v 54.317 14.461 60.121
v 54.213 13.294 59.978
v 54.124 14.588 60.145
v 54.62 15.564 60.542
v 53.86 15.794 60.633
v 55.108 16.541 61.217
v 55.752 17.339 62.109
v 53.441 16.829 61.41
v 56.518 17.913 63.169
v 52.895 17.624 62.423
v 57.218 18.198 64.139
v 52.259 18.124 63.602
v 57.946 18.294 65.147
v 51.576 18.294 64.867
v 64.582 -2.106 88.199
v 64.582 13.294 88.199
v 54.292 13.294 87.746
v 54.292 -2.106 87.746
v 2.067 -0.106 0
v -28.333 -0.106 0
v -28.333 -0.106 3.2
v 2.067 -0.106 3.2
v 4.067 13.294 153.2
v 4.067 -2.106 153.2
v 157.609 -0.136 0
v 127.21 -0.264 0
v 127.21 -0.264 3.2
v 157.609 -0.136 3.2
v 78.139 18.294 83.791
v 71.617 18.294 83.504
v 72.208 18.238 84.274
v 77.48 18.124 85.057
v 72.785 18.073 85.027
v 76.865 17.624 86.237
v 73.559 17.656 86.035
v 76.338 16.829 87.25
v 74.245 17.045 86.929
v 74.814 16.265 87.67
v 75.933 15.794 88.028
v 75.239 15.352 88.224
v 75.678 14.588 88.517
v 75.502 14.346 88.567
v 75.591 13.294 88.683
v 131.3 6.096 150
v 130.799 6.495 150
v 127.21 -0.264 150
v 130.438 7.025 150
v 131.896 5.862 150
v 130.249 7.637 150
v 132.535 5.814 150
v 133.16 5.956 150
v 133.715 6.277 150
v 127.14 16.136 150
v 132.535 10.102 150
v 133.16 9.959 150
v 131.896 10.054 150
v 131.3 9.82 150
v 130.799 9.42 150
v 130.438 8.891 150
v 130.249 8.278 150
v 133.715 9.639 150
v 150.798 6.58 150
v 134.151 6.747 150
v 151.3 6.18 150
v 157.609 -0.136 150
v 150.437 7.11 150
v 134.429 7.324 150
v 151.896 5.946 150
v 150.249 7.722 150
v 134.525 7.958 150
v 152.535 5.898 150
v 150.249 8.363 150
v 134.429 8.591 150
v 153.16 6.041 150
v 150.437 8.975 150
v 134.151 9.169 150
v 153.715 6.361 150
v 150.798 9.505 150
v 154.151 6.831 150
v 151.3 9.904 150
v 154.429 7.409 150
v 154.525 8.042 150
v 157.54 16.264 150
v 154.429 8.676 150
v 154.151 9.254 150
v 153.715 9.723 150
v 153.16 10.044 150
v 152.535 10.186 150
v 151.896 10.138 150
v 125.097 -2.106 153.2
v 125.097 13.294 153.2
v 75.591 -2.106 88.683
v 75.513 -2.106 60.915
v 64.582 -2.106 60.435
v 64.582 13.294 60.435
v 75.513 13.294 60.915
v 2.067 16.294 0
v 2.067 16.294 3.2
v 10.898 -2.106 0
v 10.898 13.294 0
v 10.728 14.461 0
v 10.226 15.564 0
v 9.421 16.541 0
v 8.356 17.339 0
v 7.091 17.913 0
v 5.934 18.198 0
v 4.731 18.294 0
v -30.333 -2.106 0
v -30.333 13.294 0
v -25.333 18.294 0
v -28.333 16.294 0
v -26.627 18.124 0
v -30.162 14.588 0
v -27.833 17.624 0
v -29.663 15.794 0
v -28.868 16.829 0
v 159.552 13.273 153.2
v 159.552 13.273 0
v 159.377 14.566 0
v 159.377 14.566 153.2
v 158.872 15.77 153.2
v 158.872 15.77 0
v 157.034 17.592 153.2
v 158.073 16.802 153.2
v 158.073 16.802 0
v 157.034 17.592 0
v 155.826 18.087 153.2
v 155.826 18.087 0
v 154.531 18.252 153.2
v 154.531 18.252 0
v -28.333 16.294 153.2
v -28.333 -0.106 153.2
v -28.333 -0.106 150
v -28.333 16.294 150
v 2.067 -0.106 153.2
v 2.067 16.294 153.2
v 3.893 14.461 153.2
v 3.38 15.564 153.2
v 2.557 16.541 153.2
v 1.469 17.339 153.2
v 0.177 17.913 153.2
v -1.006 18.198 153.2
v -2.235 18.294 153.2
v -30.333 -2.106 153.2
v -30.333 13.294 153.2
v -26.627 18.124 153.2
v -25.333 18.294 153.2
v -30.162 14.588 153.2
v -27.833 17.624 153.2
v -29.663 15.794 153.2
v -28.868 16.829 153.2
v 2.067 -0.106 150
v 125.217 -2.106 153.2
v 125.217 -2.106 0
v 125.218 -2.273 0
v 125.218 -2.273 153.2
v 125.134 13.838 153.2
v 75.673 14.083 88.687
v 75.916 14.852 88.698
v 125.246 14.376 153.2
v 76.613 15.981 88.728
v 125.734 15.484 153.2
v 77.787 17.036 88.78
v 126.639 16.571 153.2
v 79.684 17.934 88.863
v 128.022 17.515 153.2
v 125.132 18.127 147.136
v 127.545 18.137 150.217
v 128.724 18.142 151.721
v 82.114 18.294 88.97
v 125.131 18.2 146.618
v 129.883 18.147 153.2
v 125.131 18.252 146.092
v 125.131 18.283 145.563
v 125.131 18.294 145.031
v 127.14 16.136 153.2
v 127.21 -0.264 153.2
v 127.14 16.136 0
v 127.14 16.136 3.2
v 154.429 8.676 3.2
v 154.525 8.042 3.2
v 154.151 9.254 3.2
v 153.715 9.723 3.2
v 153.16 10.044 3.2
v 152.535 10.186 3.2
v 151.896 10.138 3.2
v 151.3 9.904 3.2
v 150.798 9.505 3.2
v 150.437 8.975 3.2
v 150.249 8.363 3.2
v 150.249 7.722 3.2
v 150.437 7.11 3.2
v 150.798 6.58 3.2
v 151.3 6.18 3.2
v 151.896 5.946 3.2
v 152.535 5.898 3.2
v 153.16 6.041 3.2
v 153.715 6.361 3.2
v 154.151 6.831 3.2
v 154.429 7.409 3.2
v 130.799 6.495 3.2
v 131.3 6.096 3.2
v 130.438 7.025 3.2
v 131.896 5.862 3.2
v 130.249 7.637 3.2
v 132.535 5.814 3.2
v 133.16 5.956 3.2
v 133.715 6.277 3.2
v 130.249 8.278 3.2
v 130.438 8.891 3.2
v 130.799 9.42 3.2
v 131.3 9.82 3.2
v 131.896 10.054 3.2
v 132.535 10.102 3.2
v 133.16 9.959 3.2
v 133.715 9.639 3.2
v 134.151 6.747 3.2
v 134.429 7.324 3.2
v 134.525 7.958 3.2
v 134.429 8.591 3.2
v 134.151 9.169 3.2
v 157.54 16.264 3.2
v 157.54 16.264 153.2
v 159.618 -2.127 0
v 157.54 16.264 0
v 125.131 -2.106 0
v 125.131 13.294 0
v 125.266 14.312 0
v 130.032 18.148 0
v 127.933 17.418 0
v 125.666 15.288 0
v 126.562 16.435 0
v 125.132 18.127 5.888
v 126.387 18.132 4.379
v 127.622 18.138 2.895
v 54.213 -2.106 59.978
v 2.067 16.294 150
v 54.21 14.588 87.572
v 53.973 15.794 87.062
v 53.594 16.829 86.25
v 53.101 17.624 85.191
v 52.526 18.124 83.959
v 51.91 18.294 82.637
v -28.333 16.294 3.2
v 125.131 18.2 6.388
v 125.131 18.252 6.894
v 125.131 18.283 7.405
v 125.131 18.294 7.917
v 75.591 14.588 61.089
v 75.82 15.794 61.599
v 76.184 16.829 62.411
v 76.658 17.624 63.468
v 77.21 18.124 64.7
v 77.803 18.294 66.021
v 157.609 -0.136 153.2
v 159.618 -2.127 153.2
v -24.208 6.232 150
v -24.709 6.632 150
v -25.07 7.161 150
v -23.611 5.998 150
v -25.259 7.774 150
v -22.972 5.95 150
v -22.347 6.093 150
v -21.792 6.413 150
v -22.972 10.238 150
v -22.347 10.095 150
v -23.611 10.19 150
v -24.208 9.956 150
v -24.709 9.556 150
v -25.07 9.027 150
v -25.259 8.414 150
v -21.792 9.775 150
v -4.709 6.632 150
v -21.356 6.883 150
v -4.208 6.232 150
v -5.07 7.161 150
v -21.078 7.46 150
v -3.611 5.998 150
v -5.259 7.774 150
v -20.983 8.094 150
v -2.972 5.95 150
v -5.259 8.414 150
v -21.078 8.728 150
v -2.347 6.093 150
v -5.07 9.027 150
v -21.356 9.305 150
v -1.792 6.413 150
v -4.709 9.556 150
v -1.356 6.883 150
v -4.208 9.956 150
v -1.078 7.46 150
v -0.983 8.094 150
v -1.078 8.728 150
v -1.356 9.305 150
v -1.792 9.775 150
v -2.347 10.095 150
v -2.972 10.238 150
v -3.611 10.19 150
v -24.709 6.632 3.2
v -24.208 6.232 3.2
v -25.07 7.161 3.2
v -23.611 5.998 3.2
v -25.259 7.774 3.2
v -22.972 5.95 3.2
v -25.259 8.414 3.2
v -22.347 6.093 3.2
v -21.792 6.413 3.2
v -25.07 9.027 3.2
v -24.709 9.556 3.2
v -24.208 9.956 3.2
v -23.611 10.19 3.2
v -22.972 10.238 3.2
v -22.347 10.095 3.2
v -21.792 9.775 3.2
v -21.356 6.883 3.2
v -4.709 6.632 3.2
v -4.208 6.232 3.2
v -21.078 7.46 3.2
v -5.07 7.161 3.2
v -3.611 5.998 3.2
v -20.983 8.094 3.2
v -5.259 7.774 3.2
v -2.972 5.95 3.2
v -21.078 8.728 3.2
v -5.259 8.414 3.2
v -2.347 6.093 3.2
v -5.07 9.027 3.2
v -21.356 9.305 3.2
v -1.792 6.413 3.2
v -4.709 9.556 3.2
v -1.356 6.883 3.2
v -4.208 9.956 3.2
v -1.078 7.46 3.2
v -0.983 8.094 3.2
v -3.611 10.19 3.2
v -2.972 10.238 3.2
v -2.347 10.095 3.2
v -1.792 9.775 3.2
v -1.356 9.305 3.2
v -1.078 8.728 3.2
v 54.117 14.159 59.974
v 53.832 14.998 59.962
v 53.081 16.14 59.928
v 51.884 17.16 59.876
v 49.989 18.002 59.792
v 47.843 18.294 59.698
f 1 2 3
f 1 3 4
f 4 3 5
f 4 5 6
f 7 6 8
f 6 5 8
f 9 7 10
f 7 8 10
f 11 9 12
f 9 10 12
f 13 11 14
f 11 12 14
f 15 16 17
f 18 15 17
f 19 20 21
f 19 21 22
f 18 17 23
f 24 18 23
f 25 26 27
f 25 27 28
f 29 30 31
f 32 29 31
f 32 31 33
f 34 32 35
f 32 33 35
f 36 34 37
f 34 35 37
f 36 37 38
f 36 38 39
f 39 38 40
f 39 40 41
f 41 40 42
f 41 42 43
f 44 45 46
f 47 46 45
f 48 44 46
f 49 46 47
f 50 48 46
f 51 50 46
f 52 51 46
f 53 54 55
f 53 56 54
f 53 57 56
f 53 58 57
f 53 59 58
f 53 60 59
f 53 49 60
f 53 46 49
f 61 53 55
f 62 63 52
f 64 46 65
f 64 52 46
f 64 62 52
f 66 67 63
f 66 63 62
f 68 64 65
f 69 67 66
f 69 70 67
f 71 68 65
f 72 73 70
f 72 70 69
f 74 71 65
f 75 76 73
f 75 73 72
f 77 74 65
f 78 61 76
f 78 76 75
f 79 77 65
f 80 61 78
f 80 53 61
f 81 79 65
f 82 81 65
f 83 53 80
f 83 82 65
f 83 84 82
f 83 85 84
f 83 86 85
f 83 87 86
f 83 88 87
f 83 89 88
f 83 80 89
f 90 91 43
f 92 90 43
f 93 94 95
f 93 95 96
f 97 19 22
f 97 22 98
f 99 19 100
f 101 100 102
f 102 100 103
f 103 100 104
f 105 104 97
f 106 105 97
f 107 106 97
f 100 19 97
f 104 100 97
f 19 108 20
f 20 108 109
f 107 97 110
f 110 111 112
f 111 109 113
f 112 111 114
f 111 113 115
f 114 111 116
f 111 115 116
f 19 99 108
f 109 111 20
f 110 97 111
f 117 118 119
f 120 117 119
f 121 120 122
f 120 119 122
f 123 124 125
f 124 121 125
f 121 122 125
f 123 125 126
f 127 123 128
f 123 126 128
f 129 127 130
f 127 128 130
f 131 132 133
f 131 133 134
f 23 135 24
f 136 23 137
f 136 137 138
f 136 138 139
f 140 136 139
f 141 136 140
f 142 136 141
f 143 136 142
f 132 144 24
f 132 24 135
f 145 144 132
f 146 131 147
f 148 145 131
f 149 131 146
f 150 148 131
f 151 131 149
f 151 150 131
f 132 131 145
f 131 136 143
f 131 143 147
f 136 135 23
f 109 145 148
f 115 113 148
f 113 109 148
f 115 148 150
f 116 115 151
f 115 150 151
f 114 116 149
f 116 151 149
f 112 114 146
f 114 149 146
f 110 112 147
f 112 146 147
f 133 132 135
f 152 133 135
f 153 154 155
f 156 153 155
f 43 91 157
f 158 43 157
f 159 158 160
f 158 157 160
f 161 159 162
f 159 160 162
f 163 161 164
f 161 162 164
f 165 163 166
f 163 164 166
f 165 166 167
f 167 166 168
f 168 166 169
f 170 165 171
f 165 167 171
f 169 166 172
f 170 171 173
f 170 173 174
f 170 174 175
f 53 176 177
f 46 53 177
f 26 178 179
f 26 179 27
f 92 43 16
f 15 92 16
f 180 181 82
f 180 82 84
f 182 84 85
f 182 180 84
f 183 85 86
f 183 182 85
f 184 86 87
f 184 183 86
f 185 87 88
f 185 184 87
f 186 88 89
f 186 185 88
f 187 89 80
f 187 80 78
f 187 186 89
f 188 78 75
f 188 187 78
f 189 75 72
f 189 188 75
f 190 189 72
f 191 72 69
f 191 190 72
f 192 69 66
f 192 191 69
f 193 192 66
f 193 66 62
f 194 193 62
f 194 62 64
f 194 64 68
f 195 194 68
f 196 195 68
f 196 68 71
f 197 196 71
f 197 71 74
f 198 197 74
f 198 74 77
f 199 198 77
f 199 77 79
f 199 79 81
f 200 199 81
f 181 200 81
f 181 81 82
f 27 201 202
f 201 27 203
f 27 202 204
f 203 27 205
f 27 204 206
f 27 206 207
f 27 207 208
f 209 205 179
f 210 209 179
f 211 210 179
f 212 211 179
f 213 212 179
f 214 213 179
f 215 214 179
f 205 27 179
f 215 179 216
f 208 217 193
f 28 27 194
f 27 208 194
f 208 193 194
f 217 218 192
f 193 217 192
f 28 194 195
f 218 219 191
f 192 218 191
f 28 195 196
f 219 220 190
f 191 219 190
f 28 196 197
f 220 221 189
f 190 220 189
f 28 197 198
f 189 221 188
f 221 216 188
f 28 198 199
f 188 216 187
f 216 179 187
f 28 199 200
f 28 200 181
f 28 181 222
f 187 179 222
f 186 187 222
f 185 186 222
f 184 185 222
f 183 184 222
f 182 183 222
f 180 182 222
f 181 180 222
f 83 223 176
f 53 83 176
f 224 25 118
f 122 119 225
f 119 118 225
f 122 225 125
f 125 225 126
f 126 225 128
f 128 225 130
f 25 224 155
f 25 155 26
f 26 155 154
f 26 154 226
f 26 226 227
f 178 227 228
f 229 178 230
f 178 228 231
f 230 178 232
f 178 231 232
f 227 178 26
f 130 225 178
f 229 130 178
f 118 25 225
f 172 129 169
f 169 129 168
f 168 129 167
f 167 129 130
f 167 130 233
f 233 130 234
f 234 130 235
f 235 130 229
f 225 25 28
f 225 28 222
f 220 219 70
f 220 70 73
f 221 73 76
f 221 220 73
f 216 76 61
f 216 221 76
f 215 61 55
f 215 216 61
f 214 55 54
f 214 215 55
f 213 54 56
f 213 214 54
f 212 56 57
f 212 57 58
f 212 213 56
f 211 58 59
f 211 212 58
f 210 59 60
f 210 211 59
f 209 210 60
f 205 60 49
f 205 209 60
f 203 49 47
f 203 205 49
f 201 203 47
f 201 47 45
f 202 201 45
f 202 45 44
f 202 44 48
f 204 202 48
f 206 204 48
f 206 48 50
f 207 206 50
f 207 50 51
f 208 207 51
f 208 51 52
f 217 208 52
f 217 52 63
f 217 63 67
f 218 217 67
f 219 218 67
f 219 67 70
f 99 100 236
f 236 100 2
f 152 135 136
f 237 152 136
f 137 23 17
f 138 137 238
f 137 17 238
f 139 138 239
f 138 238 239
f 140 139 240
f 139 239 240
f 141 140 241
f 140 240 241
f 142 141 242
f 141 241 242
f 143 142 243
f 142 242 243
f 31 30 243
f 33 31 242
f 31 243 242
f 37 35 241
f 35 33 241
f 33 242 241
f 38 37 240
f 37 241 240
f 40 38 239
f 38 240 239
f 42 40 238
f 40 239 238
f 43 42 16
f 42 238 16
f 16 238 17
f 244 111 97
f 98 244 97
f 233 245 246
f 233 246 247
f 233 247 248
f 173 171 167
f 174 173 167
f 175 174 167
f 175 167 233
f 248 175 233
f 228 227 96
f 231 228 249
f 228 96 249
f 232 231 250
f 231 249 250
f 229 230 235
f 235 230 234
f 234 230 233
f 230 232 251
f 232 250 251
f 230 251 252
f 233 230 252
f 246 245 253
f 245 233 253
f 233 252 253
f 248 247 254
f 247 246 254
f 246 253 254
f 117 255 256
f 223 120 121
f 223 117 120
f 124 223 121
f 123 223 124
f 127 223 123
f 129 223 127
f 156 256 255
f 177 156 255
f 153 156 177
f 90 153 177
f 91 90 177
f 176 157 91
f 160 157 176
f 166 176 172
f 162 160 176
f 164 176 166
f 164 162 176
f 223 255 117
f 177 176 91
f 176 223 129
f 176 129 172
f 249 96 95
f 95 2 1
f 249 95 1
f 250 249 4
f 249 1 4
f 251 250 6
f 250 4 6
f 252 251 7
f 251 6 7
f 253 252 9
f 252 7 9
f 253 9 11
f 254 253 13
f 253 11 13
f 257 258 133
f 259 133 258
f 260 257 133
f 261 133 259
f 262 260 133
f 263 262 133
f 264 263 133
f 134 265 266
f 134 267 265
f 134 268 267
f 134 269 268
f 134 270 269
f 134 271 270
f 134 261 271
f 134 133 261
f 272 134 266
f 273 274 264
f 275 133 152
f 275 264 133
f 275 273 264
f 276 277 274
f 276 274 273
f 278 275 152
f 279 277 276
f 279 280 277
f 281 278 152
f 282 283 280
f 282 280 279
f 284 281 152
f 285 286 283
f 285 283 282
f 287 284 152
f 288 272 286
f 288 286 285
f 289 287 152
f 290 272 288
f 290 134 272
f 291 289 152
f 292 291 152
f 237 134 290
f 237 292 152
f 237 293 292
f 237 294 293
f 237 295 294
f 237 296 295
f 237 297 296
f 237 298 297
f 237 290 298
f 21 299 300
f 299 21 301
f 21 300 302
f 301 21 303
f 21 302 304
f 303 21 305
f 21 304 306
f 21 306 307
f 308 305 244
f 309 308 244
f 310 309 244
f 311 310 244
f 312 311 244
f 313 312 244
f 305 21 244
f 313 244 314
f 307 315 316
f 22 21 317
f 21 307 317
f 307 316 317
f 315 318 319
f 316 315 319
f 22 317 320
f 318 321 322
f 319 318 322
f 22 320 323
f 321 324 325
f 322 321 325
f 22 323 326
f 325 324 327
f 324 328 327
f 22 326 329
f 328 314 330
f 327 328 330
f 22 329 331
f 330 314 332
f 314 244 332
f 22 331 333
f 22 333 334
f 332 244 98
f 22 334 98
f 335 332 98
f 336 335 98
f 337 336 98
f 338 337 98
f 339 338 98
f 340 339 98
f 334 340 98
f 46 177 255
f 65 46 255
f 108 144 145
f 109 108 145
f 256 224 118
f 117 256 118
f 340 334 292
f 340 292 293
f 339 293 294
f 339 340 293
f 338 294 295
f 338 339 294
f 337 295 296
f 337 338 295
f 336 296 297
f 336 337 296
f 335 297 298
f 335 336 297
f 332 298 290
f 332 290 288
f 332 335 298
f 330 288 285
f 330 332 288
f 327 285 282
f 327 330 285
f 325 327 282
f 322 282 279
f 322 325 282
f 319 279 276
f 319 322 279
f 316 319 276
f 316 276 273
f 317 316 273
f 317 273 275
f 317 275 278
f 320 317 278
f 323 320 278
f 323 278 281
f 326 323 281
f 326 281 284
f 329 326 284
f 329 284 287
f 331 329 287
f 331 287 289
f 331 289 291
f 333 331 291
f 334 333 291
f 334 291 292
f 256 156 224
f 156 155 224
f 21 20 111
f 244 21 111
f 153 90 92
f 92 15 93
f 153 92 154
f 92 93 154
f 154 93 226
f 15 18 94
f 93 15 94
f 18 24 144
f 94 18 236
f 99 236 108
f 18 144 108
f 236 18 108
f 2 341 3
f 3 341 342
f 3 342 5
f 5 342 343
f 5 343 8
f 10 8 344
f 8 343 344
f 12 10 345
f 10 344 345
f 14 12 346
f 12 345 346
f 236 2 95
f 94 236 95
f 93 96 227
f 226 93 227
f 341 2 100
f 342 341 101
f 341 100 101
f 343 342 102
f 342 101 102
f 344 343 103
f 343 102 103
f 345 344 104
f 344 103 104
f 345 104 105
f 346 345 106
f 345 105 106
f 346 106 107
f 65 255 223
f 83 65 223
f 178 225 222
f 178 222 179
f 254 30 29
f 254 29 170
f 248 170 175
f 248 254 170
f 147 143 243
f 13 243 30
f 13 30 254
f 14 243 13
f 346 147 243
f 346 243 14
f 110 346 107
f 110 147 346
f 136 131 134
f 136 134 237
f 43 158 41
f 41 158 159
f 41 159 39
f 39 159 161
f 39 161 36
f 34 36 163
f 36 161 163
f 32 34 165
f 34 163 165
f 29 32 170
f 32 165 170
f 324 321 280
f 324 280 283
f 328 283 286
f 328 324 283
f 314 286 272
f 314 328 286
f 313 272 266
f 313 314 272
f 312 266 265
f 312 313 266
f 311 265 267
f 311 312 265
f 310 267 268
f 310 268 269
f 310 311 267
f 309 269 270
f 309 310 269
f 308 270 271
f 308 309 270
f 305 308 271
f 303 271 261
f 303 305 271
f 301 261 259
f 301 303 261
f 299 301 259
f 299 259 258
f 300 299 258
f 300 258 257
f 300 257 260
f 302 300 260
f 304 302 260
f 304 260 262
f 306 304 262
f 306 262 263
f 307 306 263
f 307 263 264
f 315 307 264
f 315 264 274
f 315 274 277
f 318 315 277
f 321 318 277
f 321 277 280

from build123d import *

# Parameters (mm, degrees)
SKETCH1_W             = 34.4
SKETCH1_H             = 20.4
SKETCH1_W_2           = 30.4
SKETCH1_H_2           = 16.4
BOSS_EXTRUDE1_DEPTH   = 3.2
BOSS_EXTRUDE1_2_DEPTH = 3.2
SKETCH4_W             = 34.4
SKETCH4_H             = 20.4
BOSS_EXTRUDE2_DEPTH   = 150
SKETCH5_W             = 30.4
SKETCH5_H             = 16.4
CUT_EXTRUDE2_DEPTH    = 3.2
BOSS_EXTRUDE4_REACH   = 221.091
SKETCH13_W            = 153.2
SKETCH13_H            = 20.4
CUT_EXTRUDE3_DEPTH    = 20.4
FILLET1_R             = 5
SKETCH2_R             = 2.15
CUT_EXTRUDE5_DEPTH    = 147


with BuildPart() as part:
    # Sketch1 → Boss-Extrude1 (new body)
    with BuildSketch(Plane.XY):
        with Locations((-13.13286664, 8.093964388)):
            Rectangle(SKETCH1_W, SKETCH1_H)
        with Locations((-13.13286664, 8.093964388)):
            Rectangle(SKETCH1_W_2, SKETCH1_H_2, mode=Mode.SUBTRACT)
    extrude(amount=BOSS_EXTRUDE1_DEPTH)



with BuildPart() as body_2:
    # Sketch1 → Boss-Extrude1 2 (new body)
    with BuildSketch(Plane.XY):
        Polygon((125.217994466, -2.2727378), (159.617685817, -2.127015635), (159.531269184, 18.272801329), (125.131577833, 18.127079165), align=None)
        Polygon((127.209504302, -0.264283525), (157.609231543, -0.135505799), (157.539759348, 16.264347055), (127.140032108, 16.135569328), align=None, mode=Mode.SUBTRACT)
    extrude(amount=BOSS_EXTRUDE1_2_DEPTH)


with BuildPart() as part_1:
    add(part.part)

    add(body_2.part)  # Boss-Extrude2 merges body 2
    # Sketch4 → Boss-Extrude2 (add)
    with BuildSketch(Plane.XY.offset(3.2)):
        with Locations((-13.13286664, 8.093964388)):
            Rectangle(SKETCH4_W, SKETCH4_H)
        Polygon((125.131577833, 18.127079165), (125.217994466, -2.2727378), (159.617685817, -2.127015635), (159.531269184, 18.272801329), align=None)
    extrude(amount=BOSS_EXTRUDE2_DEPTH)

    # Sketch5 → Cut-Extrude2 (cut)
    with BuildSketch(Plane.XY.offset(153.2)):
        with Locations((-13.13286664, 8.093964388)):
            Rectangle(SKETCH5_W, SKETCH5_H)
        Polygon((157.539759348, 16.264347055), (127.140032108, 16.135569328), (127.209504302, -0.264283525), (157.609231543, -0.135505799), align=None)
    extrude(amount=-CUT_EXTRUDE2_DEPTH, mode=Mode.SUBTRACT)

    # Boss-Extrude4: up to this face of the body (flat: up to its plane)
    boss_extrude4_end = Plane(part_1.part.faces().sort_by_distance((125.17478615, 7.927170683, 76.6))[0])
    # Sketch13 → Boss-Extrude4 (add, up to the picked face)
    with BuildSketch(Plane(origin=(4.06713336, 0, 0), x_dir=(0, 0, -1), z_dir=(1, 0, 0)), mode=Mode.PRIVATE) as boss_extrude4_sk1:
        with Locations((-76.6, 8.093964388)):
            Rectangle(SKETCH13_W, SKETCH13_H)
    boss_extrude4_tool1 = split(extrude(boss_extrude4_sk1.sketch, amount=BOSS_EXTRUDE4_REACH, mode=Mode.PRIVATE), bisect_by=boss_extrude4_end, keep=Keep.BOTH, mode=Mode.PRIVATE)
    add(boss_extrude4_tool1.solids().sort_by(Axis((4.067133, 8.093964, 76.6), (1, 0, 0)))[0])

    # Sketch14 → Cut-Extrude3 (cut)
    with BuildSketch(Plane(origin=(0, 18.293964388, 0), x_dir=(1, 0, 0), z_dir=(0, 1, 0))):
        Polygon((4.06713336, -153.2), (64.581899601, -153.2), (64.581899601, -88.198965672), (54.291599005, -87.746202034), align=None)
        Polygon((64.581899601, -88.198965672), (64.581899601, -153.2), (125.096665842, -153.2), (75.591314205, -88.683369655), align=None)
        Polygon((64.581899601, 0), (64.581899601, -60.434510767), (75.513081453, -60.915472582), (125.130870883, 0), align=None)
        Polygon((54.213366253, -59.978304961), (64.581899601, -60.434510767), (64.581899601, 0), (10.898373068, 0), align=None)
    extrude(amount=-CUT_EXTRUDE3_DEPTH, mode=Mode.SUBTRACT)

    # Fillet1
    # the kernel refuses this fillet: 5 mm, written as the material it takes off along each edge
    with BuildSketch(Plane(origin=(132.706183705, 18.293964388, 163.116916754), x_dir=(0.7933533402912364, 0, -0.6087614290087192), z_dir=(-0.6087614290087191, 0, -0.7933533402912364))) as fillet1_piece_1_section:
        with BuildLine():
            CenterArc((FILLET1_R, FILLET1_R), FILLET1_R, 180, 90)
            Line((0, FILLET1_R), (0, 0))
            Line((0, 0), (FILLET1_R, 0))
        make_face()
    fillet1_piece_1 = extrude(amount=106.321432794, mode=Mode.PRIVATE)
    fillet1_piece_1 = split(fillet1_piece_1, bisect_by=Plane(origin=(106.88840911, 17.155782702, 90.060412668), z_dir=(-0.04395654061558545, 0, 0.999033444153453)), keep=Keep.TOP, mode=Mode.PRIVATE)
    add(fillet1_piece_1, mode=Mode.SUBTRACT)
    with BuildSketch(Plane(origin=(41.803680953, 18.293964388, 87.196745277), x_dir=(0.0439565406155861, 0, -0.9990334441534529), z_dir=(0.999033444153453, 0, 0.043956540615586105))) as fillet1_piece_2_section:
        with BuildLine():
            CenterArc((FILLET1_R, -FILLET1_R), FILLET1_R, 90, 90)
            Line((0, -FILLET1_R), (0, 0))
            Line((0, 0), (FILLET1_R, 0))
        make_face()
    fillet1_piece_2 = extrude(amount=46.320322483, mode=Mode.PRIVATE)
    fillet1_piece_2 = split(fillet1_piece_2, bisect_by=Plane(origin=(58.505653555, 17.10801654, 82.254339222), z_dir=(0.7933533402912364, 0, 0.6087614290087192)), keep=Keep.TOP, mode=Mode.PRIVATE)
    fillet1_piece_2 = split(fillet1_piece_2, bisect_by=Plane(origin=(70.904619218, 17.10801654, 82.575549833), z_dir=(-0.7933533402912364, 0, 0.6087614290087191)), keep=Keep.TOP, mode=Mode.PRIVATE)
    add(fillet1_piece_2, mode=Mode.SUBTRACT)
    with BuildSketch(Plane(origin=(61.901116868, 18.293964388, 77.829285281), x_dir=(-0.7933533402912364, 0, -0.6087614290087192), z_dir=(-0.6087614290087192, 0, 0.7933533402912364))) as fillet1_piece_3_section:
        with BuildLine():
            CenterArc((FILLET1_R, FILLET1_R), FILLET1_R, 180, 90)
            Line((0, FILLET1_R), (0, 0))
            Line((0, 0), (FILLET1_R, 0))
        make_face()
    fillet1_piece_3 = extrude(amount=107.502706728, mode=Mode.PRIVATE)
    fillet1_piece_3 = split(fillet1_piece_3, bisect_by=Plane(origin=(25.940785784, 17.156890776, 86.498792671), z_dir=(-0.04395654061558545, 0, 0.999033444153453)), keep=Keep.TOP, mode=Mode.PRIVATE)
    add(fillet1_piece_3, mode=Mode.SUBTRACT)
    with BuildSketch(Plane(origin=(67.618799022, 18.293964388, 70.607237381), x_dir=(0.7753411838603286, 0, 0.6315425944542964), z_dir=(0.6315425944542965, 0, -0.7753411838603287))) as fillet1_piece_4_section:
        with BuildLine():
            CenterArc((FILLET1_R, FILLET1_R), FILLET1_R, 180, 90)
            Line((0, FILLET1_R), (0, 0))
            Line((0, 0), (FILLET1_R, 0))
        make_face()
    fillet1_piece_4 = extrude(amount=103.566022095, mode=Mode.PRIVATE)
    fillet1_piece_4 = split(fillet1_piece_4, bisect_by=Plane(origin=(103.811838578, 17.156329457, 62.160591526), z_dir=(0.04395654061558577, 0, -0.999033444153453)), keep=Keep.TOP, mode=Mode.PRIVATE)
    add(fillet1_piece_4, mode=Mode.SUBTRACT)
    with BuildSketch(Plane(origin=(41.725448201, 18.293964388, 59.428848203), x_dir=(-0.043956540615586105, 0, 0.9990334441534529), z_dir=(0.999033444153453, 0, 0.043956540615586105))) as fillet1_piece_5_section:
        with BuildLine():
            CenterArc((FILLET1_R, FILLET1_R), FILLET1_R, 180, 90)
            Line((0, FILLET1_R), (0, 0))
            Line((0, 0), (FILLET1_R, 0))
        make_face()
    fillet1_piece_5 = extrude(amount=46.320322483, mode=Mode.PRIVATE)
    fillet1_piece_5 = split(fillet1_piece_5, bisect_by=Plane(origin=(58.573091319, 17.108176182, 66.015219672), z_dir=(0.8106963672203948, 0, -0.5854668224380052)), keep=Keep.TOP, mode=Mode.PRIVATE)
    fillet1_piece_5 = split(fillet1_piece_5, bisect_by=Plane(origin=(70.976745321, 17.108176182, 66.484706167), z_dir=(-0.7753411838603287, 0, -0.6315425944542965)), keep=Keep.TOP, mode=Mode.PRIVATE)
    add(fillet1_piece_5, mode=Mode.SUBTRACT)
    with BuildSketch(Plane(origin=(3.580037788, 18.293964388, -10.13370459), x_dir=(-0.810696367220395, 0, 0.5854668224380052), z_dir=(0.5854668224380052, 0, 0.8106963672203948))) as fillet1_piece_6_section:
        with BuildLine():
            CenterArc((FILLET1_R, FILLET1_R), FILLET1_R, 180, 90)
            Line((0, FILLET1_R), (0, 0))
            Line((0, 0), (FILLET1_R, 0))
        make_face()
    fillet1_piece_6 = extrude(amount=98.983685368, mode=Mode.PRIVATE)
    fillet1_piece_6 = split(fillet1_piece_6, bisect_by=Plane(origin=(26.252750118, 17.155642398, 58.748063906), z_dir=(0.04395654061558577, 0, -0.999033444153453)), keep=Keep.TOP, mode=Mode.PRIVATE)
    add(fillet1_piece_6, mode=Mode.SUBTRACT)
    with BuildSketch(Plane(origin=(159.531269184, 18.272801329, -12.5), x_dir=(0.004236109424476813, -0.9999910276482205, 0), z_dir=(0, 0, 1))) as fillet1_piece_7:
        with BuildLine():
            CenterArc((FILLET1_R, -FILLET1_R), FILLET1_R, 90, 90)
            Line((0, -FILLET1_R), (0, 0))
            Line((0, 0), (FILLET1_R, 0))
        make_face()
    extrude(amount=178.2, mode=Mode.SUBTRACT)
    with BuildSketch(Plane(origin=(-30.33286664, 18.293964388, 165.7), x_dir=(1, 0, 0), z_dir=(0, 0, -1))) as fillet1_piece_8:
        with BuildLine():
            CenterArc((FILLET1_R, FILLET1_R), FILLET1_R, 180, 90)
            Line((0, FILLET1_R), (0, 0))
            Line((0, 0), (FILLET1_R, 0))
        make_face()
    extrude(amount=178.2, mode=Mode.SUBTRACT)
    with BuildSketch(Plane(origin=(41.803680953, 18.293964388, 87.196745277), x_dir=(0.0439565406155861, 0, -0.9990334441534529), z_dir=(0.999033444153453, 0, 0.043956540615586105))) as fillet1_piece_9a_section:
        with BuildLine():
            CenterArc((FILLET1_R, -FILLET1_R), FILLET1_R, 90, 90)
            Line((0, -FILLET1_R), (0, 0))
            Line((0, 0), (FILLET1_R, 0))
        make_face()
    fillet1_piece_9a = extrude(amount=46.320322483, mode=Mode.PRIVATE)
    fillet1_piece_9a = split(fillet1_piece_9a, bisect_by=Plane(origin=(77.278437613, 17.204839872, 90.882071688), z_dir=(0.7933533402912364, 0, -0.6087614290087191)), keep=Keep.TOP, mode=Mode.PRIVATE)
    with BuildSketch(Plane(origin=(132.706183705, 18.293964388, 163.116916754), x_dir=(0.7933533402912364, 0, -0.6087614290087192), z_dir=(-0.6087614290087191, 0, -0.7933533402912364))) as fillet1_piece_9b_section:
        with BuildLine():
            CenterArc((FILLET1_R, FILLET1_R), FILLET1_R, 180, 90)
            Line((0, FILLET1_R), (0, 0))
            Line((0, 0), (FILLET1_R, 0))
        make_face()
    fillet1_piece_9b = extrude(amount=106.321432794, mode=Mode.PRIVATE)
    fillet1_piece_9b = split(fillet1_piece_9b, bisect_by=Plane(origin=(72.822589663, 17.204839872, 88.561548356), z_dir=(0.04395654061558545, 0, -0.999033444153453)), keep=Keep.TOP, mode=Mode.PRIVATE)
    fillet1_piece_9 = fillet1_piece_9a & fillet1_piece_9b
    add(fillet1_piece_9, mode=Mode.SUBTRACT)
    with BuildSketch(Plane(origin=(61.901116868, 18.293964388, 77.829285281), x_dir=(-0.7933533402912364, 0, -0.6087614290087192), z_dir=(-0.6087614290087192, 0, 0.7933533402912364))) as fillet1_piece_10a_section:
        with BuildLine():
            CenterArc((FILLET1_R, FILLET1_R), FILLET1_R, 180, 90)
            Line((0, FILLET1_R), (0, 0))
            Line((0, 0), (FILLET1_R, 0))
        make_face()
    fillet1_piece_10a = extrude(amount=107.502706728, mode=Mode.PRIVATE)
    fillet1_piece_10a = split(fillet1_piece_10a, bisect_by=Plane(origin=(56.655534386, 17.19812243, 87.850212988), z_dir=(0.04395654061558545, 0, -0.999033444153453)), keep=Keep.TOP, mode=Mode.PRIVATE)
    with BuildSketch(Plane(origin=(41.803680953, 18.293964388, 87.196745277), x_dir=(0.0439565406155861, 0, -0.9990334441534529), z_dir=(0.999033444153453, 0, 0.043956540615586105))) as fillet1_piece_10b_section:
        with BuildLine():
            CenterArc((FILLET1_R, -FILLET1_R), FILLET1_R, 90, 90)
            Line((0, -FILLET1_R), (0, 0))
            Line((0, 0), (FILLET1_R, 0))
        make_face()
    fillet1_piece_10b = extrude(amount=46.320322483, mode=Mode.PRIVATE)
    fillet1_piece_10b = split(fillet1_piece_10b, bisect_by=Plane(origin=(52.851134035, 17.19812243, 89.623452533), z_dir=(-0.7933533402912364, 0, -0.6087614290087192)), keep=Keep.TOP, mode=Mode.PRIVATE)
    fillet1_piece_10 = fillet1_piece_10a & fillet1_piece_10b
    add(fillet1_piece_10, mode=Mode.SUBTRACT)
    with BuildSketch(Plane(origin=(67.618799022, 18.293964388, 70.607237381), x_dir=(0.7753411838603286, 0, 0.6315425944542964), z_dir=(0.6315425944542965, 0, -0.7753411838603287))) as fillet1_piece_11a_section:
        with BuildLine():
            CenterArc((FILLET1_R, FILLET1_R), FILLET1_R, 180, 90)
            Line((0, FILLET1_R), (0, 0))
            Line((0, 0), (FILLET1_R, 0))
        make_face()
    fillet1_piece_11a = extrude(amount=103.566022095, mode=Mode.PRIVATE)
    fillet1_piece_11a = split(fillet1_piece_11a, bisect_by=Plane(origin=(73.01107528, 17.200259545, 60.805386642), z_dir=(-0.04395654061558577, 0, 0.999033444153453)), keep=Keep.TOP, mode=Mode.PRIVATE)
    with BuildSketch(Plane(origin=(41.725448201, 18.293964388, 59.428848203), x_dir=(-0.043956540615586105, 0, 0.9990334441534529), z_dir=(0.999033444153453, 0, 0.043956540615586105))) as fillet1_piece_11b_section:
        with BuildLine():
            CenterArc((FILLET1_R, FILLET1_R), FILLET1_R, 180, 90)
            Line((0, FILLET1_R), (0, 0))
            Line((0, 0), (FILLET1_R, 0))
        make_face()
    fillet1_piece_11b = extrude(amount=46.320322483, mode=Mode.PRIVATE)
    fillet1_piece_11b = split(fillet1_piece_11b, bisect_by=Plane(origin=(77.094733678, 17.200259545, 58.97368731), z_dir=(0.7753411838603287, 0, 0.6315425944542965)), keep=Keep.TOP, mode=Mode.PRIVATE)
    fillet1_piece_11 = fillet1_piece_11a & fillet1_piece_11b
    add(fillet1_piece_11, mode=Mode.SUBTRACT)
    with BuildSketch(Plane(origin=(41.725448201, 18.293964388, 59.428848203), x_dir=(-0.043956540615586105, 0, 0.9990334441534529), z_dir=(0.999033444153453, 0, 0.043956540615586105))) as fillet1_piece_12a_section:
        with BuildLine():
            CenterArc((FILLET1_R, FILLET1_R), FILLET1_R, 180, 90)
            Line((0, FILLET1_R), (0, 0))
            Line((0, 0), (FILLET1_R, 0))
        make_face()
    fillet1_piece_12a = extrude(amount=46.320322483, mode=Mode.PRIVATE)
    fillet1_piece_12a = split(fillet1_piece_12a, bisect_by=Plane(origin=(52.666515046, 17.202537245, 57.836378885), z_dir=(-0.8106963672203948, 0, 0.5854668224380052)), keep=Keep.TOP, mode=Mode.PRIVATE)
    with BuildSketch(Plane(origin=(3.580037788, 18.293964388, -10.13370459), x_dir=(-0.810696367220395, 0, 0.5854668224380052), z_dir=(0.5854668224380052, 0, 0.8106963672203948))) as fillet1_piece_12b_section:
        with BuildLine():
            CenterArc((FILLET1_R, FILLET1_R), FILLET1_R, 180, 90)
            Line((0, FILLET1_R), (0, 0))
            Line((0, 0), (FILLET1_R, 0))
        make_face()
    fillet1_piece_12b = extrude(amount=98.983685368, mode=Mode.PRIVATE)
    fillet1_piece_12b = split(fillet1_piece_12b, bisect_by=Plane(origin=(56.852894283, 17.202537245, 60.094441735), z_dir=(-0.04395654061558577, 0, 0.999033444153453)), keep=Keep.TOP, mode=Mode.PRIVATE)
    fillet1_piece_12 = fillet1_piece_12a & fillet1_piece_12b
    add(fillet1_piece_12, mode=Mode.SUBTRACT)

    # Sketch2 → Cut-Extrude5 (cut)
    with BuildSketch(Plane.XY.offset(3)):
        with Locations((-23.13286664, 8.093964388)):
            Circle(SKETCH2_R)
        with Locations((-3.13286664, 8.093964388)):
            Circle(SKETCH2_R)
        with Locations((132.374721549, 7.95767067)):
            Circle(SKETCH2_R)
        with Locations((152.374542102, 8.042392859)):
            Circle(SKETCH2_R)
    extrude(amount=CUT_EXTRUDE5_DEPTH, mode=Mode.SUBTRACT)


solid = part_1.part
